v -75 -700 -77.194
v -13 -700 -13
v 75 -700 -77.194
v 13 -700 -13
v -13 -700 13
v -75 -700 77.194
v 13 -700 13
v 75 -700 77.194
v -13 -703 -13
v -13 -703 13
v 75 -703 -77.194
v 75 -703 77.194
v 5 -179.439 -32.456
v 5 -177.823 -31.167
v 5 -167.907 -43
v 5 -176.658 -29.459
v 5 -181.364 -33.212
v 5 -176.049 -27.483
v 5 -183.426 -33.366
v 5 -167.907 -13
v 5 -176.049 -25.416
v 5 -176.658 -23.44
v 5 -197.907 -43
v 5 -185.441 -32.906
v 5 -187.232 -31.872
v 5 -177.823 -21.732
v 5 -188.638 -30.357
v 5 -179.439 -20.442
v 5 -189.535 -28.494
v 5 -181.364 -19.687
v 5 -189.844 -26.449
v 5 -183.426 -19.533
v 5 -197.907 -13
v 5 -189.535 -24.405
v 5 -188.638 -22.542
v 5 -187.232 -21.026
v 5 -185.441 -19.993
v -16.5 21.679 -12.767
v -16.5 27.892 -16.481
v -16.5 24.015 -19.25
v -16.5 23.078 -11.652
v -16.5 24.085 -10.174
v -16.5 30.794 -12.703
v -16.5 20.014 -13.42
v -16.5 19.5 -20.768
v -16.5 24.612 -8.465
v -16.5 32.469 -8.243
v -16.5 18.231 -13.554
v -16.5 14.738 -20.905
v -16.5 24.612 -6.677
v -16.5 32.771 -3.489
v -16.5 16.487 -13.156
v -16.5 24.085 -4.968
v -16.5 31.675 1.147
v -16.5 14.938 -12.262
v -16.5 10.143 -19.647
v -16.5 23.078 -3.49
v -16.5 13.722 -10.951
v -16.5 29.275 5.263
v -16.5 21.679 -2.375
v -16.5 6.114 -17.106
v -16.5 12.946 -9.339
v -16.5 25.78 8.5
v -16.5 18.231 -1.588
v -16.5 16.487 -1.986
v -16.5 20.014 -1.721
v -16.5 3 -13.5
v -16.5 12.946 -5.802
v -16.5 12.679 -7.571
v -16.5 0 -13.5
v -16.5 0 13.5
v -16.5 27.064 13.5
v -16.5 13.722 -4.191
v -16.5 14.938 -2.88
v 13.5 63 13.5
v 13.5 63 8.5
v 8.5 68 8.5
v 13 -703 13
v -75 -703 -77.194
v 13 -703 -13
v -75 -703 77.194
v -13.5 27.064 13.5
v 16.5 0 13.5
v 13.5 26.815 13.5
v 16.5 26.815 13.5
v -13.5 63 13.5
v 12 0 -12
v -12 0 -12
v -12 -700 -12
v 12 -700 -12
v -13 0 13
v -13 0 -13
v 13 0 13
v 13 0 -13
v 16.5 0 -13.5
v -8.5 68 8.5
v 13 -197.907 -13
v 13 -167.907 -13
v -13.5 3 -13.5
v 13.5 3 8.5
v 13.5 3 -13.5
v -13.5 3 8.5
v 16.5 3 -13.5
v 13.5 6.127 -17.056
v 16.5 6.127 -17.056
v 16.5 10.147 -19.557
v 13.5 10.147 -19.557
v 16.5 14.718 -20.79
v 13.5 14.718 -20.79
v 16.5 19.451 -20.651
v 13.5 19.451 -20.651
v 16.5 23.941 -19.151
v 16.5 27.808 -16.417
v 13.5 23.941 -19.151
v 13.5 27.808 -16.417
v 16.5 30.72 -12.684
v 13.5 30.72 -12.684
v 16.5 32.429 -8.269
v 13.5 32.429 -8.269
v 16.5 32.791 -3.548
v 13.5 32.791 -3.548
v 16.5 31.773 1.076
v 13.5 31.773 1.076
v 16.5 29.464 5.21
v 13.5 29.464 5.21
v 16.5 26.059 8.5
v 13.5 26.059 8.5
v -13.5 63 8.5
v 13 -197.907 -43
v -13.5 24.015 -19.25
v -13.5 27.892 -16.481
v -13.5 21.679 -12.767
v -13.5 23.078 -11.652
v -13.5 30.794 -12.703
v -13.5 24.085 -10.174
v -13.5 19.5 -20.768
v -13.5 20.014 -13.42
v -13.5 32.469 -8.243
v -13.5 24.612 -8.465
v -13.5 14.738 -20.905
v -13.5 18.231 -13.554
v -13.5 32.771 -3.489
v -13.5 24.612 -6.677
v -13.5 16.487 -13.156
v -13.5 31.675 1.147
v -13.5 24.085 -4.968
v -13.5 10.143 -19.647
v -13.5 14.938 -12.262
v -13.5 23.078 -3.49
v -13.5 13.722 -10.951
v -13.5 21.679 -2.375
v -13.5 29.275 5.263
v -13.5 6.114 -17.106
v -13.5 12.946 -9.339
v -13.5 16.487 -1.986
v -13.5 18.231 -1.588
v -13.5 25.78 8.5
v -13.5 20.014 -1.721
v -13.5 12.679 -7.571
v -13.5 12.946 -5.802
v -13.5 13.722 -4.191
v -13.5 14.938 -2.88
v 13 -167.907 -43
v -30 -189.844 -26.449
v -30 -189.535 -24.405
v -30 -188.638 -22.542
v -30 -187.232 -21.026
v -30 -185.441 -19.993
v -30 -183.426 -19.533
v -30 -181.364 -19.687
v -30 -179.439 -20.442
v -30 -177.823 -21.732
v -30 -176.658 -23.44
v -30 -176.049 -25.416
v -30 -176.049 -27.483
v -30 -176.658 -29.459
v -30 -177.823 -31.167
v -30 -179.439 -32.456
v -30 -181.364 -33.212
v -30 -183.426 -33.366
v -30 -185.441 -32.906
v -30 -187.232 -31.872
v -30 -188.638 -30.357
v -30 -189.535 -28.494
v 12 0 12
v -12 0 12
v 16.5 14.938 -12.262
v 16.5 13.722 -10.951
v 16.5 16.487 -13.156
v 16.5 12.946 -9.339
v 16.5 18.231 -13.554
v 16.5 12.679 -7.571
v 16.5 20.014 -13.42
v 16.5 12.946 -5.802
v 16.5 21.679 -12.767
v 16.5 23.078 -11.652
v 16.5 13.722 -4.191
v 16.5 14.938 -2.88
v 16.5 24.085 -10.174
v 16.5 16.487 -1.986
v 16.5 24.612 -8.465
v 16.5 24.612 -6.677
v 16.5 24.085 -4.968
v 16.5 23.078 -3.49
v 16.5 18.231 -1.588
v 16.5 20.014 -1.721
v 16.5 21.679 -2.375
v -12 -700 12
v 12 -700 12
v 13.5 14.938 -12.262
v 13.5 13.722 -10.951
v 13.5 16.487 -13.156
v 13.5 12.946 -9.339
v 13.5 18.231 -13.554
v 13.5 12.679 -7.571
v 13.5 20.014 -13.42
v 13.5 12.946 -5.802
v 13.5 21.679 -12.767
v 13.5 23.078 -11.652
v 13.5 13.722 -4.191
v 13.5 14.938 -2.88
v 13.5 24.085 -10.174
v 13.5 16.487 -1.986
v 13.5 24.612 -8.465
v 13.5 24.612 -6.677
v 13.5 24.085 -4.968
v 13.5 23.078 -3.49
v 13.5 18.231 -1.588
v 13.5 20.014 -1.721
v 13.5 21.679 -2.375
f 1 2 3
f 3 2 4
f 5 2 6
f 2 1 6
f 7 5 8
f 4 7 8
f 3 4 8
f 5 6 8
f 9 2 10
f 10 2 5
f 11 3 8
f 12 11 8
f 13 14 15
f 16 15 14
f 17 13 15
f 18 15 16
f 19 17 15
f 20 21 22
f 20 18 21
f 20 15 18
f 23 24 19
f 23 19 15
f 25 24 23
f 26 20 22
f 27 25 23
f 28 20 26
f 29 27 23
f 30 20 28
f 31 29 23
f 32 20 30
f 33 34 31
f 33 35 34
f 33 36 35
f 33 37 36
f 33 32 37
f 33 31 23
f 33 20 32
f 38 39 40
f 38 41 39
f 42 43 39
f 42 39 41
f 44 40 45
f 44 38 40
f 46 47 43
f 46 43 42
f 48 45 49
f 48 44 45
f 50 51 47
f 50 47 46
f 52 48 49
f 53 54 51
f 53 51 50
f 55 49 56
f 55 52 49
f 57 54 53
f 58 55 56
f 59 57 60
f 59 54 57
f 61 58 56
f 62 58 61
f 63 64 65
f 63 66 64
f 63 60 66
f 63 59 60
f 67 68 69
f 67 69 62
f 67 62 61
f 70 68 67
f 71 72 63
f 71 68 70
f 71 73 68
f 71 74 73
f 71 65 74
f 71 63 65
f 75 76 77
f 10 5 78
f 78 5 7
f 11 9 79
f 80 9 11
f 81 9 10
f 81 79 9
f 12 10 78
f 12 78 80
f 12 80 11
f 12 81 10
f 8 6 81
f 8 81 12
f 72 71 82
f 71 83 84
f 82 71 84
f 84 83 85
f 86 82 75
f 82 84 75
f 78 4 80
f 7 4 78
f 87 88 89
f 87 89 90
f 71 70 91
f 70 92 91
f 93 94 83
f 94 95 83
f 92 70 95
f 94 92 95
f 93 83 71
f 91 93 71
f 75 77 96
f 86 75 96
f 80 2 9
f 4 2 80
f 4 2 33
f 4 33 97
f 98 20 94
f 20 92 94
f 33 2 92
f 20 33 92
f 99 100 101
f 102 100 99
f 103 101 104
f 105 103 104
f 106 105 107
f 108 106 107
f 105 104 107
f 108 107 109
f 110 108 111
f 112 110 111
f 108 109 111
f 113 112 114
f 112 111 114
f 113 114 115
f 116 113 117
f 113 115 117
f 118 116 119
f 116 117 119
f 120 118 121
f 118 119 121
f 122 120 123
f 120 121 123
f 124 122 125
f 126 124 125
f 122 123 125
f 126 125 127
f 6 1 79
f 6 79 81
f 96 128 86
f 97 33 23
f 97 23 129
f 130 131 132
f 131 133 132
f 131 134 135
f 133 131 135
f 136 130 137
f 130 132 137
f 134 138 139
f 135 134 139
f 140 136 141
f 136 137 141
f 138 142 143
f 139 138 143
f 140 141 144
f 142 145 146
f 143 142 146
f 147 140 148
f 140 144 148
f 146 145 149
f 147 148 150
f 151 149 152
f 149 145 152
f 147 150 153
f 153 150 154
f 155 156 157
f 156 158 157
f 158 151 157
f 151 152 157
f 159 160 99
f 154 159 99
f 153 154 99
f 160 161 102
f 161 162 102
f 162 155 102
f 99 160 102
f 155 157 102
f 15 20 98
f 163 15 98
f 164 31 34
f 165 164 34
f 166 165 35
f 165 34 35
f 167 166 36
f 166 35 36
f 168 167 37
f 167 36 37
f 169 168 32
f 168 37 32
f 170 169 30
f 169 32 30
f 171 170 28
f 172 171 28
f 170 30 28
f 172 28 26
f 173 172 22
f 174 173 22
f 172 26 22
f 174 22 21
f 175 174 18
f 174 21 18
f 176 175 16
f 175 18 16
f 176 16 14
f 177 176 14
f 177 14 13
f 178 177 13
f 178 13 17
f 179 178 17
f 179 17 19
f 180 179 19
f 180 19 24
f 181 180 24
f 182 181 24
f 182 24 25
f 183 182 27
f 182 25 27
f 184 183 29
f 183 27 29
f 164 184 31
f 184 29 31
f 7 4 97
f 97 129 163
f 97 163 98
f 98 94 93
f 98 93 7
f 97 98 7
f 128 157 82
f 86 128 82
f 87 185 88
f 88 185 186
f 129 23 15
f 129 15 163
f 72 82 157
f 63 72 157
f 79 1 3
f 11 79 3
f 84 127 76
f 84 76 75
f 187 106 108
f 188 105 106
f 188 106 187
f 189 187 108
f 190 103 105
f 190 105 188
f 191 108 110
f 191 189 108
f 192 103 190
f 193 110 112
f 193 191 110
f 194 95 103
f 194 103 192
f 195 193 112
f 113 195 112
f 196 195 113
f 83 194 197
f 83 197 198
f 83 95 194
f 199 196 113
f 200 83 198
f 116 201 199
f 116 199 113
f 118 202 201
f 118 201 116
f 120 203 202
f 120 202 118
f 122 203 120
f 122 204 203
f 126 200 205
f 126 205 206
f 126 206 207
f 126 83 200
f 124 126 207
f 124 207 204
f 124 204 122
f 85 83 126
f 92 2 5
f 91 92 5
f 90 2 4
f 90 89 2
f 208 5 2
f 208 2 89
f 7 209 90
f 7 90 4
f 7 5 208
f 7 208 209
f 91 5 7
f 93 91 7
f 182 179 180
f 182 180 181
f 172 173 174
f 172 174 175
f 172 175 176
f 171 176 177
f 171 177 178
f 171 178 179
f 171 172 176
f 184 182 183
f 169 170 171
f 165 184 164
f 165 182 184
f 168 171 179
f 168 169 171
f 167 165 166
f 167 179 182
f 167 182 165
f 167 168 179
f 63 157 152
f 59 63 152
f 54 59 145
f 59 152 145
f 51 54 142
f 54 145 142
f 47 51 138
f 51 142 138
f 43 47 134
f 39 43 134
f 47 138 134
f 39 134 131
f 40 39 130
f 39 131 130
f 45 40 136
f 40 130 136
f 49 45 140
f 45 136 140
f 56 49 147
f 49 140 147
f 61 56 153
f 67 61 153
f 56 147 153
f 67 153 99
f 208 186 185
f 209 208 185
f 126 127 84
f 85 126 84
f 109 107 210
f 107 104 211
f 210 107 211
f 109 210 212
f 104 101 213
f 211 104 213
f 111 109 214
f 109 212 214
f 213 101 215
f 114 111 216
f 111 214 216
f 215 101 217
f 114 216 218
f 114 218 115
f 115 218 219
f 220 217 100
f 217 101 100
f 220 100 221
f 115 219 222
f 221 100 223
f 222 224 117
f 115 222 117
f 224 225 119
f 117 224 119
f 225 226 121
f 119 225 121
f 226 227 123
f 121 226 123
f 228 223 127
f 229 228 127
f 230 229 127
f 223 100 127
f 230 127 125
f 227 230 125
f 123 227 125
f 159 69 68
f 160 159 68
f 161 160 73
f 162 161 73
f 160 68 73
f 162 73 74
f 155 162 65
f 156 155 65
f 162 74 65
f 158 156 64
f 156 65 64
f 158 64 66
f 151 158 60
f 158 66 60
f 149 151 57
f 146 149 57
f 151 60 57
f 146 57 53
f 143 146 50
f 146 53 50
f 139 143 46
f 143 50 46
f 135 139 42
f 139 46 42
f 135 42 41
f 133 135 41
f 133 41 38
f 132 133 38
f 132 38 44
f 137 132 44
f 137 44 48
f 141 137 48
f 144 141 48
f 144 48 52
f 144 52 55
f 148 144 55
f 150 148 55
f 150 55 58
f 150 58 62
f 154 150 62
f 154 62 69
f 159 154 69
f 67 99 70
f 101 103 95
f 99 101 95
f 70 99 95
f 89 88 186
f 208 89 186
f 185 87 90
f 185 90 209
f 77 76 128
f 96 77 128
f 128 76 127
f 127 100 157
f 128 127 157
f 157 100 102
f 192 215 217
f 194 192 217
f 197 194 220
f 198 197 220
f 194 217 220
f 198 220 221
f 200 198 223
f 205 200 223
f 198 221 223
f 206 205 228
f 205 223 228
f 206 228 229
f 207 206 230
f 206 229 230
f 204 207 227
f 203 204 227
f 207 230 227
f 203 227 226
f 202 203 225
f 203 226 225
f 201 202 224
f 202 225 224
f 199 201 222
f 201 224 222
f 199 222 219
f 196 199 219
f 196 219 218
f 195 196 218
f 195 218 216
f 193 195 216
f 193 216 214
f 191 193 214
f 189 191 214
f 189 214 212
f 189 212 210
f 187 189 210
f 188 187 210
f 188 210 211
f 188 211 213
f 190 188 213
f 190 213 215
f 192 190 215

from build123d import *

# Parameters (mm, degrees)
F0_W      = 26
F0_H      = 26
F0_W_2    = 24
F0_H_2    = 24
F1_DEPTH  = 700
F2_W      = 27
F2_H      = 27
F2_W_2    = 26
F2_H_2    = 26
F2_W_3    = 24
F2_H_3    = 24
F3_DEPTH  = 3
F4_W      = 150
F4_H      = 154.387555053
F4_W_2    = 26
F4_H_2    = 26
F5_DEPTH  = 3
F6_W      = 27
F6_H      = 5
F7_DEPTH  = 65
F8_SIZE   = 4.99999
F10_DEPTH = 3
F12_DEPTH = 3
F14_D     = 12
F15_W     = 8
F15_H     = 30
F16_DEPTH = 30
F17_R     = 6.9361526391
F18_DEPTH = 35


# Not quite as in the source:
# - a fillet or chamfer is up to 0.001 mm smaller than in the source, because OpenCascade refuses the exact size


with BuildPart() as f1:
    # F0 (on Front) → F1 (new body)
    with BuildSketch(Plane.XZ):
        Rectangle(F0_W, F0_H)
        Rectangle(F0_W_2, F0_H_2, mode=Mode.SUBTRACT)
    extrude(amount=F1_DEPTH)

    # F2 (on face) → F3 (join)
    with BuildSketch(Plane(origin=(0, 0, 0), x_dir=(-1, 0, 0), z_dir=(0, 1, 0))):
        Rectangle(F2_W, F2_H)
        Rectangle(F2_W_2, F2_H_2, mode=Mode.SUBTRACT)
        Rectangle(F2_W_2, F2_H_2)
        Rectangle(F2_W_3, F2_H_3, mode=Mode.SUBTRACT)
        Rectangle(F2_W_3, F2_H_3)
    extrude(amount=F3_DEPTH)

    # F6 (on face) → F7 (join)
    with BuildSketch(Plane(origin=(0, 3, 0), x_dir=(-1, 0, 0), z_dir=(0, 1, 0))):
        with Locations((0, 11)):
            Rectangle(F6_W, F6_H)
    extrude(amount=F7_DEPTH)

    # F8 (size 5 in the source; OpenCascade refuses exactly that, so slightly less here)
    f8_edges = [f1.edges().sort_by_distance(p)[0] for p in [
        (13.5, 68, 11),
        (0, 68, 13.5),
        (-13.5, 68, 11),
    ]]
    chamfer(f8_edges, length=F8_SIZE)

    # F9 (on face) → F10 (join)
    with BuildSketch(Plane.YZ.offset(13.5)):
        Polygon((0, -13.5), (3, -13.5), (3, 8.5), (26.0593052953, 8.5), (26.8148947507, 13.5), (0, 13.5), align=None)
        with BuildLine():
            Line((3, 8.5), (3, -13.5))
            ThreePointArc((3, -13.5), (27.8075589796, -16.4172407177), (26.0593052953, 8.5))
            Line((26.0593052953, 8.5), (3, 8.5))
        make_face()
    extrude(amount=F10_DEPTH)

    # F11 (on face) → F12 (join)
    with BuildSketch(Plane(origin=(-13.5, 0, 0), x_dir=(0, -1, 0), z_dir=(-1, 0, 0))):
        Polygon((-27.0638596267, 13.5), (-25.7802139968, 8.5), (-3, 8.5), (-3, -13.5), (0, -13.5), (0, 13.5), align=None)
        with BuildLine():
            Line((-3, 8.5), (-25.7802139968, 8.5))
            ThreePointArc((-25.7802139968, 8.5), (-27.8924695055, -16.4812139716), (-3, -13.5))
            Line((-3, -13.5), (-3, 8.5))
        make_face()
    extrude(amount=F12_DEPTH)

    # F14 (through all)
    with Locations(Plane.YZ.offset(16.5)):
        with Locations((18.6792816967, -7.5708841905)):
            Hole(F14_D / 2)

    # F15 (on face) → F16 (join)
    with BuildSketch(Plane(origin=(0, 0, -13), x_dir=(1, 0, 0), z_dir=(0, 0, -1))):
        with Locations((9, 182.907372117)):
            Rectangle(F15_W, F15_H)
    extrude(amount=F16_DEPTH)

    # F17 (on face) → F18 (join)
    with BuildSketch(Plane(origin=(5, 0, 0), x_dir=(0, -1, 0), z_dir=(-1, 0, 0))):
        with Locations((182.907372117, -26.4493469149)):
            Circle(F17_R)
    extrude(amount=F18_DEPTH)


with BuildPart() as f5:
    # F4 (on face) → F5 (new body)
    with BuildSketch(Plane.XZ.offset(700)):
        Rectangle(F4_W, F4_H)
        Rectangle(F4_W_2, F4_H_2, mode=Mode.SUBTRACT)
    extrude(amount=F5_DEPTH)


solid = Compound([f1.part, f5.part])
